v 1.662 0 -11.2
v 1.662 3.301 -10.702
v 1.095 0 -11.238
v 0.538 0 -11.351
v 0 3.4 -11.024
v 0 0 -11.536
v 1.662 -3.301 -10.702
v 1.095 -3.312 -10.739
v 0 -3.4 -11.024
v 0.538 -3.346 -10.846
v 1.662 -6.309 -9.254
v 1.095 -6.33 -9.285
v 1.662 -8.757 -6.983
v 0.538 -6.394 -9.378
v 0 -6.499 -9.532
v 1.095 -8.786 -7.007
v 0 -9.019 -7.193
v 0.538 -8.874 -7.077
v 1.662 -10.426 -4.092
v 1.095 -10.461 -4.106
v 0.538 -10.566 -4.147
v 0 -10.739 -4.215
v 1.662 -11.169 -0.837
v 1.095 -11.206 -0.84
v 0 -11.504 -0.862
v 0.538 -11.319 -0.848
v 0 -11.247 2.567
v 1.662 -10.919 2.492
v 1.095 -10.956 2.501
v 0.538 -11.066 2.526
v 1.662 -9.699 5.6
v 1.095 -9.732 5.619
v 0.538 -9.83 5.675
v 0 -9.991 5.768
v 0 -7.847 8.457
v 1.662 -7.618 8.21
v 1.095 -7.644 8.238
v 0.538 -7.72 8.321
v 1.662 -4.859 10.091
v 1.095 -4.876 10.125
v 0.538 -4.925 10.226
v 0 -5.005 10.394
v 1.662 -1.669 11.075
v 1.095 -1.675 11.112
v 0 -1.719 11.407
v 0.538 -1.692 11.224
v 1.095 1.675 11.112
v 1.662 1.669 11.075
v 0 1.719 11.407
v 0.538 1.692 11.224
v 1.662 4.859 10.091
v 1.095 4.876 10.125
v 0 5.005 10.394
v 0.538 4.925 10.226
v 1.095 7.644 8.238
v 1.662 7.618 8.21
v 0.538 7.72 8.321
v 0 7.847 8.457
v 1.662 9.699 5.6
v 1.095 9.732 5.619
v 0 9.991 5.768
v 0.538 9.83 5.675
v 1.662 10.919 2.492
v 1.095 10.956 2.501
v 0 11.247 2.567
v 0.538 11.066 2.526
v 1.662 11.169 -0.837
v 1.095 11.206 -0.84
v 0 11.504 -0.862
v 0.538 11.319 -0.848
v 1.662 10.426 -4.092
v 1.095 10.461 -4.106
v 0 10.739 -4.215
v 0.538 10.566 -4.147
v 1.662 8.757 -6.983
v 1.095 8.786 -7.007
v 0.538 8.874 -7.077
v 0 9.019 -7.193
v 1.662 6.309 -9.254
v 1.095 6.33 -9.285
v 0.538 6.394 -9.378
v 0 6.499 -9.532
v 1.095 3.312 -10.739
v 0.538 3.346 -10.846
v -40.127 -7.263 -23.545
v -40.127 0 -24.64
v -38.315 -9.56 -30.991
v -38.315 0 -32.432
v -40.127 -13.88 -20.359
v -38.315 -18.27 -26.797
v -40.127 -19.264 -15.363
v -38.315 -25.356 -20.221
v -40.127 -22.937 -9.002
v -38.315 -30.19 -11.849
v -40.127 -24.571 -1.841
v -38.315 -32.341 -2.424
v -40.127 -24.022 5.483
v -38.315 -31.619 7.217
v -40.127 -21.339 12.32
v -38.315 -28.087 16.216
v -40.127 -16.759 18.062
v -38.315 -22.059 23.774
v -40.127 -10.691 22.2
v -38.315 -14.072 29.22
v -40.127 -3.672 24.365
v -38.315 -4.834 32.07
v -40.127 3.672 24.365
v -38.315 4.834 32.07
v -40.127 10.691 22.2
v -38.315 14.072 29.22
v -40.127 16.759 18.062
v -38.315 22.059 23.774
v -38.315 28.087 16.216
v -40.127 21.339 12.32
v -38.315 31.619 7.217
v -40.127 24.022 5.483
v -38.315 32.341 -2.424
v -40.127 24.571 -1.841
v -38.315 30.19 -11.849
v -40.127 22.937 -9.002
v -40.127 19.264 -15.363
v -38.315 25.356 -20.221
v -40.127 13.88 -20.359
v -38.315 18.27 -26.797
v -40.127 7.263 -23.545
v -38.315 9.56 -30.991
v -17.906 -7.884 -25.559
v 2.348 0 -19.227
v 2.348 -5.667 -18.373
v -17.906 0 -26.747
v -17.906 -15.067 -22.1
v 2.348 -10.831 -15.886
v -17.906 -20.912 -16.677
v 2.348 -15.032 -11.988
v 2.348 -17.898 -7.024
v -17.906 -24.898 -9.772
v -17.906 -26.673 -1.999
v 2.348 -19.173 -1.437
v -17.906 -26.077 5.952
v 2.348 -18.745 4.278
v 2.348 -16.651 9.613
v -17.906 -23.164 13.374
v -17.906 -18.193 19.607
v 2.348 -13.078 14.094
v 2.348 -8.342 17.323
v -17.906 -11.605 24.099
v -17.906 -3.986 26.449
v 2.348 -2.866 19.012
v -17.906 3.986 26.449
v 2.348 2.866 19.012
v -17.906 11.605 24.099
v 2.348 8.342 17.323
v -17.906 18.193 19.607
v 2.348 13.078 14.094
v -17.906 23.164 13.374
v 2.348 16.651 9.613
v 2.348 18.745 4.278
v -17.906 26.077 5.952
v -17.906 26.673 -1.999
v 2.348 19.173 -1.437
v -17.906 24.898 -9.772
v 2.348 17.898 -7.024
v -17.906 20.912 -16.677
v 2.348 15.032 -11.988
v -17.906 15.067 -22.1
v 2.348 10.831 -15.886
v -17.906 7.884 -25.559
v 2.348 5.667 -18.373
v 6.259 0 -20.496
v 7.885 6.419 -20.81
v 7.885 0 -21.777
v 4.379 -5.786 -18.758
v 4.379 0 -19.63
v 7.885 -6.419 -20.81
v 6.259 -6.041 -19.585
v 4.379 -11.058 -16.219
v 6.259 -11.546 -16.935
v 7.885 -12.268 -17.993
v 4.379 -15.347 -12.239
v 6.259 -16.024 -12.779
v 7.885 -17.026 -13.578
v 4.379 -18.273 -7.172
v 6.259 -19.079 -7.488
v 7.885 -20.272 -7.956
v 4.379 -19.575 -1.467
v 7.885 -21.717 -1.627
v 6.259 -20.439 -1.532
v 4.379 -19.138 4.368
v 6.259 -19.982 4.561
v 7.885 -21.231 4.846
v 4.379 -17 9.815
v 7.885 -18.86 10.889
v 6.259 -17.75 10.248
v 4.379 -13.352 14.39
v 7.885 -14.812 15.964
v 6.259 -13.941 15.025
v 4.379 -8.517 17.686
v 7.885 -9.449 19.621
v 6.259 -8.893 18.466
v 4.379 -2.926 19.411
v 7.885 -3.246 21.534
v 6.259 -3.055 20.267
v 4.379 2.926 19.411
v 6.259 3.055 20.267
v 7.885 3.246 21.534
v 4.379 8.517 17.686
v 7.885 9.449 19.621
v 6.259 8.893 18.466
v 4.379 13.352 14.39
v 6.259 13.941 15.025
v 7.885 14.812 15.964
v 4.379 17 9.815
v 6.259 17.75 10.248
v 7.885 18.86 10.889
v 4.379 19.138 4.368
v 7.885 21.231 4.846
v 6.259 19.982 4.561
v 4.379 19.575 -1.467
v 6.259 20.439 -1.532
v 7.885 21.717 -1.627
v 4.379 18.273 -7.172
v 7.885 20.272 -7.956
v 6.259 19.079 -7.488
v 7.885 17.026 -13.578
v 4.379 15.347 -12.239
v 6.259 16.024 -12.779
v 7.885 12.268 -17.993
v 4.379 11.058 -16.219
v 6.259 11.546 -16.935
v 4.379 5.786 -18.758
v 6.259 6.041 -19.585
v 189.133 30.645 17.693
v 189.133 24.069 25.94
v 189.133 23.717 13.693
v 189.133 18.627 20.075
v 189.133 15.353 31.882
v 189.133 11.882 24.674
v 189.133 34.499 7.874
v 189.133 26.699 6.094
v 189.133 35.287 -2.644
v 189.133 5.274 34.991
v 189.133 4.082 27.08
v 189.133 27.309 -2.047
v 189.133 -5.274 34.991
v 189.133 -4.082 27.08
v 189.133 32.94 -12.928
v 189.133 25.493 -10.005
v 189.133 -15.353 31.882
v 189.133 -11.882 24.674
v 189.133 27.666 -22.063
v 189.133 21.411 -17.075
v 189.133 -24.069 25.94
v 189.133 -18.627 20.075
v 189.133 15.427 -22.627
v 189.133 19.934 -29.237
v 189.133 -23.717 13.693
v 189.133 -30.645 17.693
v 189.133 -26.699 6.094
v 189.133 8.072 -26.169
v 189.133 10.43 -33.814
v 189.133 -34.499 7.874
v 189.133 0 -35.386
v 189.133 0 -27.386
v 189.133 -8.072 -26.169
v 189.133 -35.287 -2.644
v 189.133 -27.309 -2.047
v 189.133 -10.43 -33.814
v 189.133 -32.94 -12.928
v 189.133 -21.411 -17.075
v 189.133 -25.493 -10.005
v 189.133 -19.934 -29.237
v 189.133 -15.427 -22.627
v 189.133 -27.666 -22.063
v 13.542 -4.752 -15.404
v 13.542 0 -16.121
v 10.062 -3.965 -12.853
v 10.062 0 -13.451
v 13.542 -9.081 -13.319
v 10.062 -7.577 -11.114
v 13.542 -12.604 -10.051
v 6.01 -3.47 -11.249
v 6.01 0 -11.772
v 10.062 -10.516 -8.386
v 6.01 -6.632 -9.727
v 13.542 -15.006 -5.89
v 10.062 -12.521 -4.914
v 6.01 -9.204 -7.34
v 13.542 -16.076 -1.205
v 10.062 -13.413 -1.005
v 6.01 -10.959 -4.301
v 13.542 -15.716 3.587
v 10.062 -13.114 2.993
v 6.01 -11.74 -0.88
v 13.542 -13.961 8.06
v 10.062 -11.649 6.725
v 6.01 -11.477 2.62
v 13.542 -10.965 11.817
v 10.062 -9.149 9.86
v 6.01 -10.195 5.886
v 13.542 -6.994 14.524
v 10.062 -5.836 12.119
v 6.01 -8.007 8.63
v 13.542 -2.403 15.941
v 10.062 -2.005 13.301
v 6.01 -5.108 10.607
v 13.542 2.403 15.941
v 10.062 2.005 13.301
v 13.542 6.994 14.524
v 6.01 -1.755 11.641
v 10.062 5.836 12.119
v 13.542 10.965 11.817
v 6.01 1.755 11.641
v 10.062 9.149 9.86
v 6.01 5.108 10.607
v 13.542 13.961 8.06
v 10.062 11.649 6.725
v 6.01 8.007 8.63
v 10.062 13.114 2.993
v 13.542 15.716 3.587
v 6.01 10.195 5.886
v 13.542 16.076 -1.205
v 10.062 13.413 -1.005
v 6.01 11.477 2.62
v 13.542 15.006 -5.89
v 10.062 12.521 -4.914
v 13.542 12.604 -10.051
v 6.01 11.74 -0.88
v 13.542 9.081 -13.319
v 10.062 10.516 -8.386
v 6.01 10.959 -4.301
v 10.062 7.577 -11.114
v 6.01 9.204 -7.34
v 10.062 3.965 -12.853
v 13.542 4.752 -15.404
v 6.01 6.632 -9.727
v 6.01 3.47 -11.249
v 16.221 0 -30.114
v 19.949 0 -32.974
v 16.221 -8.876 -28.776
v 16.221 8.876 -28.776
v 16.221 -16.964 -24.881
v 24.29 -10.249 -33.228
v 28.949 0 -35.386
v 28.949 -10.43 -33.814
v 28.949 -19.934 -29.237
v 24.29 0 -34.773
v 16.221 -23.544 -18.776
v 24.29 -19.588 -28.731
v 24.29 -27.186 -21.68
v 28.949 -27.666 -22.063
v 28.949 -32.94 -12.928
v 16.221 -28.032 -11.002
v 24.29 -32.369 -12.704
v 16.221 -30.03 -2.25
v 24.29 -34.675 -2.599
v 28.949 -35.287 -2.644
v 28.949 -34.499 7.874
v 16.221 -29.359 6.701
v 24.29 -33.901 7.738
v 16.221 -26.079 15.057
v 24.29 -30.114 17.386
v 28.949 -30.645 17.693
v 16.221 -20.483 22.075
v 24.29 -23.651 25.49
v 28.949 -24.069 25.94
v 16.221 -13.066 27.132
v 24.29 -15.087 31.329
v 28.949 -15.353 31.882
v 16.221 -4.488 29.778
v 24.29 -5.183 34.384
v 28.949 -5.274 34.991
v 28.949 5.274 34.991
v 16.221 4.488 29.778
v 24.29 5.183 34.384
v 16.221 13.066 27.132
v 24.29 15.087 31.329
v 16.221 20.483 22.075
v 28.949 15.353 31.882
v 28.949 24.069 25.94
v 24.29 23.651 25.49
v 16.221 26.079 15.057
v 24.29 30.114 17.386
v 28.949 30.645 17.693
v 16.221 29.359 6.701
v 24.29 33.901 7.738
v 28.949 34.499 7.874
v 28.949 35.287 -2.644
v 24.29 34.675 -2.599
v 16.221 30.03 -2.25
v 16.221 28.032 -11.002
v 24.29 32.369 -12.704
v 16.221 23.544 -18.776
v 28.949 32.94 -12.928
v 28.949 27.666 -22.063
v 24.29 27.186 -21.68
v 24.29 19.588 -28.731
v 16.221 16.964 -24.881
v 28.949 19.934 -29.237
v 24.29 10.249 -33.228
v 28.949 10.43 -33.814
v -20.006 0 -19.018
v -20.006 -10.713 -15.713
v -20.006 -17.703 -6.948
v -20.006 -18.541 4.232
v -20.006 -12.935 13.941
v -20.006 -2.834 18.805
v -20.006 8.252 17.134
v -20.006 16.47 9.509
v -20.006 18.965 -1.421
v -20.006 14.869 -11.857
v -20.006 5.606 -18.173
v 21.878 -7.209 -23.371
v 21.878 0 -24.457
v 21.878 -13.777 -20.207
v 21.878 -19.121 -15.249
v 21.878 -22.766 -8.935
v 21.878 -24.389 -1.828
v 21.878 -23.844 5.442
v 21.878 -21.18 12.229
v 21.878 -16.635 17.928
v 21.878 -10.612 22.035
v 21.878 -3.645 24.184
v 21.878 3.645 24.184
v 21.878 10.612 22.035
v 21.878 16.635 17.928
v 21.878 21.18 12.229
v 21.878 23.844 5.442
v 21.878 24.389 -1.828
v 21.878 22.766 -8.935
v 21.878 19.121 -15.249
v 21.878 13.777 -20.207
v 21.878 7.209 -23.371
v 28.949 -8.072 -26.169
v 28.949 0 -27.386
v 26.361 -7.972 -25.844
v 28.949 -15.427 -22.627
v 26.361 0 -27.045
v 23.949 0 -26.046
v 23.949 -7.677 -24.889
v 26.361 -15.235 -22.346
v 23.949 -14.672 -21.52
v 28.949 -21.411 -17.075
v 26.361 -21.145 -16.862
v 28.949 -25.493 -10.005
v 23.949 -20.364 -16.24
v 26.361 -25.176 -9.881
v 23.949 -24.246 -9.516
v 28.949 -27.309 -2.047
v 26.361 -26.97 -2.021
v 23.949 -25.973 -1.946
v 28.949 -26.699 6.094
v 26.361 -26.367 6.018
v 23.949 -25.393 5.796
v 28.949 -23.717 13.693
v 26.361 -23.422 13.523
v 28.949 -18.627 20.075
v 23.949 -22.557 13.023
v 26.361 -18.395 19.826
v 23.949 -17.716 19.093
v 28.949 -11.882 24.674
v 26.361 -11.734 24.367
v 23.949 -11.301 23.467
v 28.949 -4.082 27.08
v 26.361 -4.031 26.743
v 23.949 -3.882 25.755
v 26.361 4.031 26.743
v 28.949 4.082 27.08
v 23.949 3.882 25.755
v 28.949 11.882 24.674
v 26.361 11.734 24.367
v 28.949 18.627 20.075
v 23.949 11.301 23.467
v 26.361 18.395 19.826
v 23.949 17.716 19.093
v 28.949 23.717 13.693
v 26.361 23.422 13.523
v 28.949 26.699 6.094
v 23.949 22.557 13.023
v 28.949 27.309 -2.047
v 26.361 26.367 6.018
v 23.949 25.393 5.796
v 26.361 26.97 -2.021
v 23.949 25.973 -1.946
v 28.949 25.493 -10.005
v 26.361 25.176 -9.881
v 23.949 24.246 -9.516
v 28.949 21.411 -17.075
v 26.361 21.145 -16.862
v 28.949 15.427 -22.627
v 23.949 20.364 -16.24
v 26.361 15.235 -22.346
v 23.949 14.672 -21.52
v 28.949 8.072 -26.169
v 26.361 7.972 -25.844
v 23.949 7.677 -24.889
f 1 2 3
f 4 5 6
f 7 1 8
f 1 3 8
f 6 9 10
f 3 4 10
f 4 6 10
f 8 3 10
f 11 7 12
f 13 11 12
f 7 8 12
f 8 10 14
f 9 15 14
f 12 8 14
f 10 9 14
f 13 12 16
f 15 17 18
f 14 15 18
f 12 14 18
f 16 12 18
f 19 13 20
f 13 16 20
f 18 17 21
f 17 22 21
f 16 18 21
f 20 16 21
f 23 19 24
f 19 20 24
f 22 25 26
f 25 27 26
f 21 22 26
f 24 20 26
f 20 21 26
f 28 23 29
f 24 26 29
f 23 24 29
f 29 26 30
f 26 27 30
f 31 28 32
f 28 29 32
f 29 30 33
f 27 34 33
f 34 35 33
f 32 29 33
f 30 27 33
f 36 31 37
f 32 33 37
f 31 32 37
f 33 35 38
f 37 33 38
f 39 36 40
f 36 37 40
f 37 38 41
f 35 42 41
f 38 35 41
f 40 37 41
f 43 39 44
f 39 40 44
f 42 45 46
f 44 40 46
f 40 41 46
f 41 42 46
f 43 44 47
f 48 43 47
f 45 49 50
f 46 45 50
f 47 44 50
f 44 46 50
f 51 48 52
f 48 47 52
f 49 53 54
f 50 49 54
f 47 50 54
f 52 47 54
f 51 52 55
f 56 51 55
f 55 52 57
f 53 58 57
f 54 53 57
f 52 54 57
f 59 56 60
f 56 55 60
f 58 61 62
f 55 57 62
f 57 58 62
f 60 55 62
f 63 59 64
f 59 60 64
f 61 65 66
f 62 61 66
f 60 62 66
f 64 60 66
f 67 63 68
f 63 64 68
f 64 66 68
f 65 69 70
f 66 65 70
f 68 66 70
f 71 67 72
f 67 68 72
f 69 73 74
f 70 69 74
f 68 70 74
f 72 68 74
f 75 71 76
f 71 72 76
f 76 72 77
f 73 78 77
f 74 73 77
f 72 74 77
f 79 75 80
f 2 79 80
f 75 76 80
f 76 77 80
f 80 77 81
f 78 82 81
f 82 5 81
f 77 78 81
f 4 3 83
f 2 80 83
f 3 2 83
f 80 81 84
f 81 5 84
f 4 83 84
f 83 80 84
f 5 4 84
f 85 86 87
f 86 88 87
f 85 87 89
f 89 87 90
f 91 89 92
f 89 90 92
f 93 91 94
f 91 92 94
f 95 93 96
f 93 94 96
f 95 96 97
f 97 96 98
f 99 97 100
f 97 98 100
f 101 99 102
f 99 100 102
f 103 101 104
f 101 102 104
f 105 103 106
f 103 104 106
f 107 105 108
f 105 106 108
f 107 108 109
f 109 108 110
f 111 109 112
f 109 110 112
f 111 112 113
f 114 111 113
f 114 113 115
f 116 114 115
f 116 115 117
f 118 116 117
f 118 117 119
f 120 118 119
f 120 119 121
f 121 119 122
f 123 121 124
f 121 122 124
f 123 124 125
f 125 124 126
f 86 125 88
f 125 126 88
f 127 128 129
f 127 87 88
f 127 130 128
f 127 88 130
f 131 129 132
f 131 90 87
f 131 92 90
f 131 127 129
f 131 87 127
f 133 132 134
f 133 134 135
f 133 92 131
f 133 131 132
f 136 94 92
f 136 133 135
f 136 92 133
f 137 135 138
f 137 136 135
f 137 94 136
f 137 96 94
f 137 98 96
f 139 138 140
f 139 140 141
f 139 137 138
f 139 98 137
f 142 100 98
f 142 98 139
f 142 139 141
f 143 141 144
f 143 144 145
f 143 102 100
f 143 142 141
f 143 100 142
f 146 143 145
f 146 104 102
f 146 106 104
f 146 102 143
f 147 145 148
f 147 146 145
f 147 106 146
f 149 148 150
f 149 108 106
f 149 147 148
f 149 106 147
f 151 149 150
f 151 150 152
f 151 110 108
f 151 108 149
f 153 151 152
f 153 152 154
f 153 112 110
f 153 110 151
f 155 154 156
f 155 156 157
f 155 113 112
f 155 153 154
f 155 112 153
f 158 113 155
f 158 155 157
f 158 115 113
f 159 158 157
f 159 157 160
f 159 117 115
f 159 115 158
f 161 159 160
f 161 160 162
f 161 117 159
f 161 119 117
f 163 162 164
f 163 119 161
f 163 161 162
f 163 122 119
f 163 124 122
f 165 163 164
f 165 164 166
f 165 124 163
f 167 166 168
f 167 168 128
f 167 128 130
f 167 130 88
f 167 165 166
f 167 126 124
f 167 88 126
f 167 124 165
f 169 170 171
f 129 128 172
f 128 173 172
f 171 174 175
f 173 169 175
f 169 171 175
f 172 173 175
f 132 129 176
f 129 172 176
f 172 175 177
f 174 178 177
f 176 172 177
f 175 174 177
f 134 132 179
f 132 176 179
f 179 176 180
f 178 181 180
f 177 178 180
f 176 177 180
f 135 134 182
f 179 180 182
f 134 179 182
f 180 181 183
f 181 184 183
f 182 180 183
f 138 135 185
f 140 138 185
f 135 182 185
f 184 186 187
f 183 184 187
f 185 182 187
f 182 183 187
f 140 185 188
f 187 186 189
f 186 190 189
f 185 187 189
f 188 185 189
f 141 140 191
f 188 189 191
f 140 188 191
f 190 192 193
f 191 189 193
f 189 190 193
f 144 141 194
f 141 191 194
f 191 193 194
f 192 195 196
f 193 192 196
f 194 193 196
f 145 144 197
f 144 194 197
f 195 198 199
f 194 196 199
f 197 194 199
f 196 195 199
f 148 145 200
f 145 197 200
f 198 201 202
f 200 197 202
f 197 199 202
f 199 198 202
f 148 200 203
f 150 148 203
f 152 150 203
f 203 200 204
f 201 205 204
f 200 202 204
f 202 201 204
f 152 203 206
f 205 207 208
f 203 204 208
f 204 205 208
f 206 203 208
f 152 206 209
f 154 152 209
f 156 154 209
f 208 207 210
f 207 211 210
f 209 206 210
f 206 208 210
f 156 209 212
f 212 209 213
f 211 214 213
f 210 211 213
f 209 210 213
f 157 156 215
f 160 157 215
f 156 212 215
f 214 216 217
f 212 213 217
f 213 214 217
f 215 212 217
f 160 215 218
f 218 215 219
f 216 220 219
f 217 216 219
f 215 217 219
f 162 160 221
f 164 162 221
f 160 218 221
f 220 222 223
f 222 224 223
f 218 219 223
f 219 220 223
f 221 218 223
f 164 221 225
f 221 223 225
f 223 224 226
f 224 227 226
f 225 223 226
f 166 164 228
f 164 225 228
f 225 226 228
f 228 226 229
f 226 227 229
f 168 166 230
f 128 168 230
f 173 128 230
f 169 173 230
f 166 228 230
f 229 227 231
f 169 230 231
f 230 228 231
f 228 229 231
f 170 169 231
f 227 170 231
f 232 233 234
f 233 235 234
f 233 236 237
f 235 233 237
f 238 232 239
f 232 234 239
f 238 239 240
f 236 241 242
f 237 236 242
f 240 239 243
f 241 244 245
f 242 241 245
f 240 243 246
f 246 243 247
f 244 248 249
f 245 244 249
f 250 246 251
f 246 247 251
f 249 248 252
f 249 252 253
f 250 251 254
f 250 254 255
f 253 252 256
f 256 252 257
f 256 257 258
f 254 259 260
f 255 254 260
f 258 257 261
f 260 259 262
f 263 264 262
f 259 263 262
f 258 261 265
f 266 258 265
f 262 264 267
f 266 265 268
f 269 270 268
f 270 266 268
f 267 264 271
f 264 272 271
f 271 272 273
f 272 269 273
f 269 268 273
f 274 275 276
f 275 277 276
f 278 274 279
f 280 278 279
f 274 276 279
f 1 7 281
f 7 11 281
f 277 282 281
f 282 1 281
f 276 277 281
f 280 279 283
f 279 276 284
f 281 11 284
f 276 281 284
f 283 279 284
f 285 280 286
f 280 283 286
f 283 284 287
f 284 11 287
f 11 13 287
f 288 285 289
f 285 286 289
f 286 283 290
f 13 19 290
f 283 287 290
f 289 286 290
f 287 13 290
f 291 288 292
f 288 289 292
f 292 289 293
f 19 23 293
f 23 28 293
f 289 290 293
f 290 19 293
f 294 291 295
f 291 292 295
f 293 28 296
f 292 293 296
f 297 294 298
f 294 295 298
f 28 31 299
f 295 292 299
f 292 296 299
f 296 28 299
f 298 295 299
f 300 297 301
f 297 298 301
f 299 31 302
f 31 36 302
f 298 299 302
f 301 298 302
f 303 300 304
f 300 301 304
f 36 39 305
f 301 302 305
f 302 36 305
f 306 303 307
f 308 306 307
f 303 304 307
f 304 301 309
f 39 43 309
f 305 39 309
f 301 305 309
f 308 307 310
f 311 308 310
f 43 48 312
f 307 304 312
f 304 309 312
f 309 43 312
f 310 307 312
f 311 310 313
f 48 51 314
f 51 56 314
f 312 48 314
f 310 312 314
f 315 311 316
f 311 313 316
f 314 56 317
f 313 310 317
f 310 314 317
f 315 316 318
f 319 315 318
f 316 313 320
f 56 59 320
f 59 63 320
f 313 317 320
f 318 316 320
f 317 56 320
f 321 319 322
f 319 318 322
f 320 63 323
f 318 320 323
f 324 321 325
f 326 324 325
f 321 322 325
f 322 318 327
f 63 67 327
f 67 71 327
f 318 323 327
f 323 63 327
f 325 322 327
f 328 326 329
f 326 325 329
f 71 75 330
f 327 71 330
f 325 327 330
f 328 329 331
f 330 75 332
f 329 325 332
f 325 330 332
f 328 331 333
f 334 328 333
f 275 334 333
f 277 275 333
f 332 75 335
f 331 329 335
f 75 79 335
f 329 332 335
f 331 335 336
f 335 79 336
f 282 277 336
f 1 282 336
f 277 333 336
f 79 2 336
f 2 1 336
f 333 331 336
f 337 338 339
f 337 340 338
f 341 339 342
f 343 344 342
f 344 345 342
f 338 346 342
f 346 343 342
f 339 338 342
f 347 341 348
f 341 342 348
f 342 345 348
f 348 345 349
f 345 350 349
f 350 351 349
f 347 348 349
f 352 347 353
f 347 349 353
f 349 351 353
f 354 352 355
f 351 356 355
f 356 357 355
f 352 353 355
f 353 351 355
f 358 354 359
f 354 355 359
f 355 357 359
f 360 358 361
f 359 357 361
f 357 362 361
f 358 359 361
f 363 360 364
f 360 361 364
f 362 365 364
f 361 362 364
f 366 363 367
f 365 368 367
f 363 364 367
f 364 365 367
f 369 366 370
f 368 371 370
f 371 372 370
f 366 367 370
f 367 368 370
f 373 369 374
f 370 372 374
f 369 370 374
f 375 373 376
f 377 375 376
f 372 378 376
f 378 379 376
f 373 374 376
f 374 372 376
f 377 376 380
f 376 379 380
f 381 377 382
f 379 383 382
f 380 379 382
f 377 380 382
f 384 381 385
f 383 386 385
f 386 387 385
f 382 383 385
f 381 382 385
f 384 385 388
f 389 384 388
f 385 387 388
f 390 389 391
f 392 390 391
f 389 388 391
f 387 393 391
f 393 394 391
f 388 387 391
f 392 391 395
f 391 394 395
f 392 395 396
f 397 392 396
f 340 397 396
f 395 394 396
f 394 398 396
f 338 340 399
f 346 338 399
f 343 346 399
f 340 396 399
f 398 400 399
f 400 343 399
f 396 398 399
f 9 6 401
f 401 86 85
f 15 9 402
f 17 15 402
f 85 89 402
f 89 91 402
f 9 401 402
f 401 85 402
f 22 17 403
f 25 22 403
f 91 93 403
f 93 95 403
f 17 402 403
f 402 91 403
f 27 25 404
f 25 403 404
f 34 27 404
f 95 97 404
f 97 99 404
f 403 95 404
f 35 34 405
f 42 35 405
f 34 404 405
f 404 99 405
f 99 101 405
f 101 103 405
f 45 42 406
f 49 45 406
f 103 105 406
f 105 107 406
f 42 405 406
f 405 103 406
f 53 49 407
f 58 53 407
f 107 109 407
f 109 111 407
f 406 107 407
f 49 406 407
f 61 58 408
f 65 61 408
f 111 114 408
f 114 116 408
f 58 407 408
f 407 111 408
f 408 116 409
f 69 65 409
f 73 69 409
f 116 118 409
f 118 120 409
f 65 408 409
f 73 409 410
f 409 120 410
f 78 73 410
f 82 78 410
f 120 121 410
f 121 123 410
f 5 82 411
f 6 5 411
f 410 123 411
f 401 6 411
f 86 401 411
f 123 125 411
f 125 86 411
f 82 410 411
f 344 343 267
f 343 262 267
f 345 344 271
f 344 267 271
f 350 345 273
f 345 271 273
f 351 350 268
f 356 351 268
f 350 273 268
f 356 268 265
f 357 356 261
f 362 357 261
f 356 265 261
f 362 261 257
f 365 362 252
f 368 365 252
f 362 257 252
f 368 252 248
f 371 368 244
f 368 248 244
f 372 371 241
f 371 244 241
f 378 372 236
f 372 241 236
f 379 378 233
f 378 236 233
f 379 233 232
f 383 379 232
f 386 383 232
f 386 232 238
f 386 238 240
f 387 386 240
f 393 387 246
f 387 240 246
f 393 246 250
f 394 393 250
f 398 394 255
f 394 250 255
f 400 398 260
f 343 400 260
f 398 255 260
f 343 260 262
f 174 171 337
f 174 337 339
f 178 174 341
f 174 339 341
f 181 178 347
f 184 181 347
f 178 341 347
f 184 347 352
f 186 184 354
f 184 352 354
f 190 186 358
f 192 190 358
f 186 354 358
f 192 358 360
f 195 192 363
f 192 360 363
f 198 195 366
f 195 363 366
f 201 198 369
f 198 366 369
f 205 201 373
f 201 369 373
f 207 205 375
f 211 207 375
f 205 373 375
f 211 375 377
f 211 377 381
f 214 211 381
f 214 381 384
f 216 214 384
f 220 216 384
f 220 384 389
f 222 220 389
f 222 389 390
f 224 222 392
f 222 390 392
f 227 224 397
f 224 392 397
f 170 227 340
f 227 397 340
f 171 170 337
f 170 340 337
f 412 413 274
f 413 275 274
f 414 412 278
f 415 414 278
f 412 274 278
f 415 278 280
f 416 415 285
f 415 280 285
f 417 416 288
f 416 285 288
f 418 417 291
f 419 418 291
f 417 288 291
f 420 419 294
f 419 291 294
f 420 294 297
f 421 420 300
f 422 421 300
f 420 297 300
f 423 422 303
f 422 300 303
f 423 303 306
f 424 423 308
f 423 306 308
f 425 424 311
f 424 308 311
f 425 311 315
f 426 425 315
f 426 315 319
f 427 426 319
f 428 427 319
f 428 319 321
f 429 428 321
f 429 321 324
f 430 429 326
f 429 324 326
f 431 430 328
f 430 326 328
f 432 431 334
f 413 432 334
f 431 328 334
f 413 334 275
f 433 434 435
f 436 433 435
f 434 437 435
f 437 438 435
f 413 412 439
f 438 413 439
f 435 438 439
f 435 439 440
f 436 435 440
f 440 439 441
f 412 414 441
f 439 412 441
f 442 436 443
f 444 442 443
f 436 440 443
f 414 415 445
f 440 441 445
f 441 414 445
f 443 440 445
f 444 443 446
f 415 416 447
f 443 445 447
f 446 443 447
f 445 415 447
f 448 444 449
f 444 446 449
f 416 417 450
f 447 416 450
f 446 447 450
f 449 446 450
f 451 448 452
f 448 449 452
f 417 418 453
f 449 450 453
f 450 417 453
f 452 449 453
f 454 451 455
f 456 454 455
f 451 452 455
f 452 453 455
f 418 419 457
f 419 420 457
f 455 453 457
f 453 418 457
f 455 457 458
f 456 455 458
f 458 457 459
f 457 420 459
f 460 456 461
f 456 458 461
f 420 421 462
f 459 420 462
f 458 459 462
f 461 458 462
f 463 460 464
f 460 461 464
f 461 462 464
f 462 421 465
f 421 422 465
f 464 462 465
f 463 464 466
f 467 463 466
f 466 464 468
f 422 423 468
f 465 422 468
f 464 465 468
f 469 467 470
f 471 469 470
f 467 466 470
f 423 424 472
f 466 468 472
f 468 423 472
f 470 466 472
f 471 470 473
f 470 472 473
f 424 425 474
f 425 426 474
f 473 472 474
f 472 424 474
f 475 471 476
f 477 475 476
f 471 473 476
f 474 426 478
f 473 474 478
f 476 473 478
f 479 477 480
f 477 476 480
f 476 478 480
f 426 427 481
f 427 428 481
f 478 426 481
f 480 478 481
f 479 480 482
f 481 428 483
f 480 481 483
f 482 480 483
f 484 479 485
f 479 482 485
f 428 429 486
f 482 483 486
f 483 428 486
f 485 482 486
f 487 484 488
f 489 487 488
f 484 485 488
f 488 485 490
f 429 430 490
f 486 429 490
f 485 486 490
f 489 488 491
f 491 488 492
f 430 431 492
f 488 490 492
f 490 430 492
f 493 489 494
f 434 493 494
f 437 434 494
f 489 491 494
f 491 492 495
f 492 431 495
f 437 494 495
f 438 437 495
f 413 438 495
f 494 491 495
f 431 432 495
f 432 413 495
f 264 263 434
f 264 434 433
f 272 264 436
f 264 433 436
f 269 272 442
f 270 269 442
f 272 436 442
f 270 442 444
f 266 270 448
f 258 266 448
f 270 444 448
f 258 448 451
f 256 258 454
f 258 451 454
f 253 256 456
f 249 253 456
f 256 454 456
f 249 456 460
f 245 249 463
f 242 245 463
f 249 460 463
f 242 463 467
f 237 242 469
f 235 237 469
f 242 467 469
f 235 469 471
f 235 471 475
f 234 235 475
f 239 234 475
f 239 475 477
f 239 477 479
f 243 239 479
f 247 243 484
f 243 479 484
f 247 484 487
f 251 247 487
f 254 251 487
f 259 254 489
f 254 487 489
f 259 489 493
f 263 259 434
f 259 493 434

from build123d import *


with BuildPart() as part:
    # Sketch1 → Revolve1 (revolve)
    with BuildSketch(Plane.XY, mode=Mode.PRIVATE) as revolve1_sk:
        with BuildLine():
            Line((189.133015331, 27.386004017), (28.949236933, 27.386004017))
            ThreePointArc((28.949236933, 27.386004017), (25.12240261, 26.624799342), (21.878169121, 24.457071829))
            Line((21.878169121, 24.457071829), (13.541703369, 16.120606076))
            ThreePointArc((13.541703369, 16.120606076), (8.091391109, 12.478823854), (1.662309445, 11.2))
            ThreePointArc((1.662309445, 11.2), (0.81433228, 11.284876268), (0, 11.536137468))
            add(Edge.make_bspline(
                [(0, 11.536137468), (-19.948257354, 19.947595697), (-40.127010283, 24.64)],
                knots=[0, 0, 0, 1, 1, 1], degree=2))
            Line((-40.127010283, 24.64), (-38.315022829, 32.432092239))
            add(Edge.make_bspline(
                [(2.348184674, 19.226769399), (-17.827706836, 27.665327765), (-38.315022829, 32.432092239)],
                knots=[0.018493807, 0.018493807, 0.018493807, 1, 1, 1], degree=2))
            ThreePointArc((2.348184674, 19.226769399), (5.344435892, 20.007381854), (7.884849119, 21.777460326))
            Line((7.884849119, 21.777460326), (16.221314872, 30.113926078))
            ThreePointArc((16.221314872, 30.113926078), (22.060935151, 34.015835602), (28.949236933, 35.386004017))
            Line((28.949236933, 35.386004017), (189.133015331, 35.386004017))
            Line((189.133015331, 35.386004017), (189.133015331, 27.386004017))
        make_face()
    revolve(revolve1_sk.sketch.rotate(Axis((0, 0, 0), (-1, 0, 0)), 90), axis=Axis((0, 0, 0), (-1, 0, 0)))


solid = part.part
